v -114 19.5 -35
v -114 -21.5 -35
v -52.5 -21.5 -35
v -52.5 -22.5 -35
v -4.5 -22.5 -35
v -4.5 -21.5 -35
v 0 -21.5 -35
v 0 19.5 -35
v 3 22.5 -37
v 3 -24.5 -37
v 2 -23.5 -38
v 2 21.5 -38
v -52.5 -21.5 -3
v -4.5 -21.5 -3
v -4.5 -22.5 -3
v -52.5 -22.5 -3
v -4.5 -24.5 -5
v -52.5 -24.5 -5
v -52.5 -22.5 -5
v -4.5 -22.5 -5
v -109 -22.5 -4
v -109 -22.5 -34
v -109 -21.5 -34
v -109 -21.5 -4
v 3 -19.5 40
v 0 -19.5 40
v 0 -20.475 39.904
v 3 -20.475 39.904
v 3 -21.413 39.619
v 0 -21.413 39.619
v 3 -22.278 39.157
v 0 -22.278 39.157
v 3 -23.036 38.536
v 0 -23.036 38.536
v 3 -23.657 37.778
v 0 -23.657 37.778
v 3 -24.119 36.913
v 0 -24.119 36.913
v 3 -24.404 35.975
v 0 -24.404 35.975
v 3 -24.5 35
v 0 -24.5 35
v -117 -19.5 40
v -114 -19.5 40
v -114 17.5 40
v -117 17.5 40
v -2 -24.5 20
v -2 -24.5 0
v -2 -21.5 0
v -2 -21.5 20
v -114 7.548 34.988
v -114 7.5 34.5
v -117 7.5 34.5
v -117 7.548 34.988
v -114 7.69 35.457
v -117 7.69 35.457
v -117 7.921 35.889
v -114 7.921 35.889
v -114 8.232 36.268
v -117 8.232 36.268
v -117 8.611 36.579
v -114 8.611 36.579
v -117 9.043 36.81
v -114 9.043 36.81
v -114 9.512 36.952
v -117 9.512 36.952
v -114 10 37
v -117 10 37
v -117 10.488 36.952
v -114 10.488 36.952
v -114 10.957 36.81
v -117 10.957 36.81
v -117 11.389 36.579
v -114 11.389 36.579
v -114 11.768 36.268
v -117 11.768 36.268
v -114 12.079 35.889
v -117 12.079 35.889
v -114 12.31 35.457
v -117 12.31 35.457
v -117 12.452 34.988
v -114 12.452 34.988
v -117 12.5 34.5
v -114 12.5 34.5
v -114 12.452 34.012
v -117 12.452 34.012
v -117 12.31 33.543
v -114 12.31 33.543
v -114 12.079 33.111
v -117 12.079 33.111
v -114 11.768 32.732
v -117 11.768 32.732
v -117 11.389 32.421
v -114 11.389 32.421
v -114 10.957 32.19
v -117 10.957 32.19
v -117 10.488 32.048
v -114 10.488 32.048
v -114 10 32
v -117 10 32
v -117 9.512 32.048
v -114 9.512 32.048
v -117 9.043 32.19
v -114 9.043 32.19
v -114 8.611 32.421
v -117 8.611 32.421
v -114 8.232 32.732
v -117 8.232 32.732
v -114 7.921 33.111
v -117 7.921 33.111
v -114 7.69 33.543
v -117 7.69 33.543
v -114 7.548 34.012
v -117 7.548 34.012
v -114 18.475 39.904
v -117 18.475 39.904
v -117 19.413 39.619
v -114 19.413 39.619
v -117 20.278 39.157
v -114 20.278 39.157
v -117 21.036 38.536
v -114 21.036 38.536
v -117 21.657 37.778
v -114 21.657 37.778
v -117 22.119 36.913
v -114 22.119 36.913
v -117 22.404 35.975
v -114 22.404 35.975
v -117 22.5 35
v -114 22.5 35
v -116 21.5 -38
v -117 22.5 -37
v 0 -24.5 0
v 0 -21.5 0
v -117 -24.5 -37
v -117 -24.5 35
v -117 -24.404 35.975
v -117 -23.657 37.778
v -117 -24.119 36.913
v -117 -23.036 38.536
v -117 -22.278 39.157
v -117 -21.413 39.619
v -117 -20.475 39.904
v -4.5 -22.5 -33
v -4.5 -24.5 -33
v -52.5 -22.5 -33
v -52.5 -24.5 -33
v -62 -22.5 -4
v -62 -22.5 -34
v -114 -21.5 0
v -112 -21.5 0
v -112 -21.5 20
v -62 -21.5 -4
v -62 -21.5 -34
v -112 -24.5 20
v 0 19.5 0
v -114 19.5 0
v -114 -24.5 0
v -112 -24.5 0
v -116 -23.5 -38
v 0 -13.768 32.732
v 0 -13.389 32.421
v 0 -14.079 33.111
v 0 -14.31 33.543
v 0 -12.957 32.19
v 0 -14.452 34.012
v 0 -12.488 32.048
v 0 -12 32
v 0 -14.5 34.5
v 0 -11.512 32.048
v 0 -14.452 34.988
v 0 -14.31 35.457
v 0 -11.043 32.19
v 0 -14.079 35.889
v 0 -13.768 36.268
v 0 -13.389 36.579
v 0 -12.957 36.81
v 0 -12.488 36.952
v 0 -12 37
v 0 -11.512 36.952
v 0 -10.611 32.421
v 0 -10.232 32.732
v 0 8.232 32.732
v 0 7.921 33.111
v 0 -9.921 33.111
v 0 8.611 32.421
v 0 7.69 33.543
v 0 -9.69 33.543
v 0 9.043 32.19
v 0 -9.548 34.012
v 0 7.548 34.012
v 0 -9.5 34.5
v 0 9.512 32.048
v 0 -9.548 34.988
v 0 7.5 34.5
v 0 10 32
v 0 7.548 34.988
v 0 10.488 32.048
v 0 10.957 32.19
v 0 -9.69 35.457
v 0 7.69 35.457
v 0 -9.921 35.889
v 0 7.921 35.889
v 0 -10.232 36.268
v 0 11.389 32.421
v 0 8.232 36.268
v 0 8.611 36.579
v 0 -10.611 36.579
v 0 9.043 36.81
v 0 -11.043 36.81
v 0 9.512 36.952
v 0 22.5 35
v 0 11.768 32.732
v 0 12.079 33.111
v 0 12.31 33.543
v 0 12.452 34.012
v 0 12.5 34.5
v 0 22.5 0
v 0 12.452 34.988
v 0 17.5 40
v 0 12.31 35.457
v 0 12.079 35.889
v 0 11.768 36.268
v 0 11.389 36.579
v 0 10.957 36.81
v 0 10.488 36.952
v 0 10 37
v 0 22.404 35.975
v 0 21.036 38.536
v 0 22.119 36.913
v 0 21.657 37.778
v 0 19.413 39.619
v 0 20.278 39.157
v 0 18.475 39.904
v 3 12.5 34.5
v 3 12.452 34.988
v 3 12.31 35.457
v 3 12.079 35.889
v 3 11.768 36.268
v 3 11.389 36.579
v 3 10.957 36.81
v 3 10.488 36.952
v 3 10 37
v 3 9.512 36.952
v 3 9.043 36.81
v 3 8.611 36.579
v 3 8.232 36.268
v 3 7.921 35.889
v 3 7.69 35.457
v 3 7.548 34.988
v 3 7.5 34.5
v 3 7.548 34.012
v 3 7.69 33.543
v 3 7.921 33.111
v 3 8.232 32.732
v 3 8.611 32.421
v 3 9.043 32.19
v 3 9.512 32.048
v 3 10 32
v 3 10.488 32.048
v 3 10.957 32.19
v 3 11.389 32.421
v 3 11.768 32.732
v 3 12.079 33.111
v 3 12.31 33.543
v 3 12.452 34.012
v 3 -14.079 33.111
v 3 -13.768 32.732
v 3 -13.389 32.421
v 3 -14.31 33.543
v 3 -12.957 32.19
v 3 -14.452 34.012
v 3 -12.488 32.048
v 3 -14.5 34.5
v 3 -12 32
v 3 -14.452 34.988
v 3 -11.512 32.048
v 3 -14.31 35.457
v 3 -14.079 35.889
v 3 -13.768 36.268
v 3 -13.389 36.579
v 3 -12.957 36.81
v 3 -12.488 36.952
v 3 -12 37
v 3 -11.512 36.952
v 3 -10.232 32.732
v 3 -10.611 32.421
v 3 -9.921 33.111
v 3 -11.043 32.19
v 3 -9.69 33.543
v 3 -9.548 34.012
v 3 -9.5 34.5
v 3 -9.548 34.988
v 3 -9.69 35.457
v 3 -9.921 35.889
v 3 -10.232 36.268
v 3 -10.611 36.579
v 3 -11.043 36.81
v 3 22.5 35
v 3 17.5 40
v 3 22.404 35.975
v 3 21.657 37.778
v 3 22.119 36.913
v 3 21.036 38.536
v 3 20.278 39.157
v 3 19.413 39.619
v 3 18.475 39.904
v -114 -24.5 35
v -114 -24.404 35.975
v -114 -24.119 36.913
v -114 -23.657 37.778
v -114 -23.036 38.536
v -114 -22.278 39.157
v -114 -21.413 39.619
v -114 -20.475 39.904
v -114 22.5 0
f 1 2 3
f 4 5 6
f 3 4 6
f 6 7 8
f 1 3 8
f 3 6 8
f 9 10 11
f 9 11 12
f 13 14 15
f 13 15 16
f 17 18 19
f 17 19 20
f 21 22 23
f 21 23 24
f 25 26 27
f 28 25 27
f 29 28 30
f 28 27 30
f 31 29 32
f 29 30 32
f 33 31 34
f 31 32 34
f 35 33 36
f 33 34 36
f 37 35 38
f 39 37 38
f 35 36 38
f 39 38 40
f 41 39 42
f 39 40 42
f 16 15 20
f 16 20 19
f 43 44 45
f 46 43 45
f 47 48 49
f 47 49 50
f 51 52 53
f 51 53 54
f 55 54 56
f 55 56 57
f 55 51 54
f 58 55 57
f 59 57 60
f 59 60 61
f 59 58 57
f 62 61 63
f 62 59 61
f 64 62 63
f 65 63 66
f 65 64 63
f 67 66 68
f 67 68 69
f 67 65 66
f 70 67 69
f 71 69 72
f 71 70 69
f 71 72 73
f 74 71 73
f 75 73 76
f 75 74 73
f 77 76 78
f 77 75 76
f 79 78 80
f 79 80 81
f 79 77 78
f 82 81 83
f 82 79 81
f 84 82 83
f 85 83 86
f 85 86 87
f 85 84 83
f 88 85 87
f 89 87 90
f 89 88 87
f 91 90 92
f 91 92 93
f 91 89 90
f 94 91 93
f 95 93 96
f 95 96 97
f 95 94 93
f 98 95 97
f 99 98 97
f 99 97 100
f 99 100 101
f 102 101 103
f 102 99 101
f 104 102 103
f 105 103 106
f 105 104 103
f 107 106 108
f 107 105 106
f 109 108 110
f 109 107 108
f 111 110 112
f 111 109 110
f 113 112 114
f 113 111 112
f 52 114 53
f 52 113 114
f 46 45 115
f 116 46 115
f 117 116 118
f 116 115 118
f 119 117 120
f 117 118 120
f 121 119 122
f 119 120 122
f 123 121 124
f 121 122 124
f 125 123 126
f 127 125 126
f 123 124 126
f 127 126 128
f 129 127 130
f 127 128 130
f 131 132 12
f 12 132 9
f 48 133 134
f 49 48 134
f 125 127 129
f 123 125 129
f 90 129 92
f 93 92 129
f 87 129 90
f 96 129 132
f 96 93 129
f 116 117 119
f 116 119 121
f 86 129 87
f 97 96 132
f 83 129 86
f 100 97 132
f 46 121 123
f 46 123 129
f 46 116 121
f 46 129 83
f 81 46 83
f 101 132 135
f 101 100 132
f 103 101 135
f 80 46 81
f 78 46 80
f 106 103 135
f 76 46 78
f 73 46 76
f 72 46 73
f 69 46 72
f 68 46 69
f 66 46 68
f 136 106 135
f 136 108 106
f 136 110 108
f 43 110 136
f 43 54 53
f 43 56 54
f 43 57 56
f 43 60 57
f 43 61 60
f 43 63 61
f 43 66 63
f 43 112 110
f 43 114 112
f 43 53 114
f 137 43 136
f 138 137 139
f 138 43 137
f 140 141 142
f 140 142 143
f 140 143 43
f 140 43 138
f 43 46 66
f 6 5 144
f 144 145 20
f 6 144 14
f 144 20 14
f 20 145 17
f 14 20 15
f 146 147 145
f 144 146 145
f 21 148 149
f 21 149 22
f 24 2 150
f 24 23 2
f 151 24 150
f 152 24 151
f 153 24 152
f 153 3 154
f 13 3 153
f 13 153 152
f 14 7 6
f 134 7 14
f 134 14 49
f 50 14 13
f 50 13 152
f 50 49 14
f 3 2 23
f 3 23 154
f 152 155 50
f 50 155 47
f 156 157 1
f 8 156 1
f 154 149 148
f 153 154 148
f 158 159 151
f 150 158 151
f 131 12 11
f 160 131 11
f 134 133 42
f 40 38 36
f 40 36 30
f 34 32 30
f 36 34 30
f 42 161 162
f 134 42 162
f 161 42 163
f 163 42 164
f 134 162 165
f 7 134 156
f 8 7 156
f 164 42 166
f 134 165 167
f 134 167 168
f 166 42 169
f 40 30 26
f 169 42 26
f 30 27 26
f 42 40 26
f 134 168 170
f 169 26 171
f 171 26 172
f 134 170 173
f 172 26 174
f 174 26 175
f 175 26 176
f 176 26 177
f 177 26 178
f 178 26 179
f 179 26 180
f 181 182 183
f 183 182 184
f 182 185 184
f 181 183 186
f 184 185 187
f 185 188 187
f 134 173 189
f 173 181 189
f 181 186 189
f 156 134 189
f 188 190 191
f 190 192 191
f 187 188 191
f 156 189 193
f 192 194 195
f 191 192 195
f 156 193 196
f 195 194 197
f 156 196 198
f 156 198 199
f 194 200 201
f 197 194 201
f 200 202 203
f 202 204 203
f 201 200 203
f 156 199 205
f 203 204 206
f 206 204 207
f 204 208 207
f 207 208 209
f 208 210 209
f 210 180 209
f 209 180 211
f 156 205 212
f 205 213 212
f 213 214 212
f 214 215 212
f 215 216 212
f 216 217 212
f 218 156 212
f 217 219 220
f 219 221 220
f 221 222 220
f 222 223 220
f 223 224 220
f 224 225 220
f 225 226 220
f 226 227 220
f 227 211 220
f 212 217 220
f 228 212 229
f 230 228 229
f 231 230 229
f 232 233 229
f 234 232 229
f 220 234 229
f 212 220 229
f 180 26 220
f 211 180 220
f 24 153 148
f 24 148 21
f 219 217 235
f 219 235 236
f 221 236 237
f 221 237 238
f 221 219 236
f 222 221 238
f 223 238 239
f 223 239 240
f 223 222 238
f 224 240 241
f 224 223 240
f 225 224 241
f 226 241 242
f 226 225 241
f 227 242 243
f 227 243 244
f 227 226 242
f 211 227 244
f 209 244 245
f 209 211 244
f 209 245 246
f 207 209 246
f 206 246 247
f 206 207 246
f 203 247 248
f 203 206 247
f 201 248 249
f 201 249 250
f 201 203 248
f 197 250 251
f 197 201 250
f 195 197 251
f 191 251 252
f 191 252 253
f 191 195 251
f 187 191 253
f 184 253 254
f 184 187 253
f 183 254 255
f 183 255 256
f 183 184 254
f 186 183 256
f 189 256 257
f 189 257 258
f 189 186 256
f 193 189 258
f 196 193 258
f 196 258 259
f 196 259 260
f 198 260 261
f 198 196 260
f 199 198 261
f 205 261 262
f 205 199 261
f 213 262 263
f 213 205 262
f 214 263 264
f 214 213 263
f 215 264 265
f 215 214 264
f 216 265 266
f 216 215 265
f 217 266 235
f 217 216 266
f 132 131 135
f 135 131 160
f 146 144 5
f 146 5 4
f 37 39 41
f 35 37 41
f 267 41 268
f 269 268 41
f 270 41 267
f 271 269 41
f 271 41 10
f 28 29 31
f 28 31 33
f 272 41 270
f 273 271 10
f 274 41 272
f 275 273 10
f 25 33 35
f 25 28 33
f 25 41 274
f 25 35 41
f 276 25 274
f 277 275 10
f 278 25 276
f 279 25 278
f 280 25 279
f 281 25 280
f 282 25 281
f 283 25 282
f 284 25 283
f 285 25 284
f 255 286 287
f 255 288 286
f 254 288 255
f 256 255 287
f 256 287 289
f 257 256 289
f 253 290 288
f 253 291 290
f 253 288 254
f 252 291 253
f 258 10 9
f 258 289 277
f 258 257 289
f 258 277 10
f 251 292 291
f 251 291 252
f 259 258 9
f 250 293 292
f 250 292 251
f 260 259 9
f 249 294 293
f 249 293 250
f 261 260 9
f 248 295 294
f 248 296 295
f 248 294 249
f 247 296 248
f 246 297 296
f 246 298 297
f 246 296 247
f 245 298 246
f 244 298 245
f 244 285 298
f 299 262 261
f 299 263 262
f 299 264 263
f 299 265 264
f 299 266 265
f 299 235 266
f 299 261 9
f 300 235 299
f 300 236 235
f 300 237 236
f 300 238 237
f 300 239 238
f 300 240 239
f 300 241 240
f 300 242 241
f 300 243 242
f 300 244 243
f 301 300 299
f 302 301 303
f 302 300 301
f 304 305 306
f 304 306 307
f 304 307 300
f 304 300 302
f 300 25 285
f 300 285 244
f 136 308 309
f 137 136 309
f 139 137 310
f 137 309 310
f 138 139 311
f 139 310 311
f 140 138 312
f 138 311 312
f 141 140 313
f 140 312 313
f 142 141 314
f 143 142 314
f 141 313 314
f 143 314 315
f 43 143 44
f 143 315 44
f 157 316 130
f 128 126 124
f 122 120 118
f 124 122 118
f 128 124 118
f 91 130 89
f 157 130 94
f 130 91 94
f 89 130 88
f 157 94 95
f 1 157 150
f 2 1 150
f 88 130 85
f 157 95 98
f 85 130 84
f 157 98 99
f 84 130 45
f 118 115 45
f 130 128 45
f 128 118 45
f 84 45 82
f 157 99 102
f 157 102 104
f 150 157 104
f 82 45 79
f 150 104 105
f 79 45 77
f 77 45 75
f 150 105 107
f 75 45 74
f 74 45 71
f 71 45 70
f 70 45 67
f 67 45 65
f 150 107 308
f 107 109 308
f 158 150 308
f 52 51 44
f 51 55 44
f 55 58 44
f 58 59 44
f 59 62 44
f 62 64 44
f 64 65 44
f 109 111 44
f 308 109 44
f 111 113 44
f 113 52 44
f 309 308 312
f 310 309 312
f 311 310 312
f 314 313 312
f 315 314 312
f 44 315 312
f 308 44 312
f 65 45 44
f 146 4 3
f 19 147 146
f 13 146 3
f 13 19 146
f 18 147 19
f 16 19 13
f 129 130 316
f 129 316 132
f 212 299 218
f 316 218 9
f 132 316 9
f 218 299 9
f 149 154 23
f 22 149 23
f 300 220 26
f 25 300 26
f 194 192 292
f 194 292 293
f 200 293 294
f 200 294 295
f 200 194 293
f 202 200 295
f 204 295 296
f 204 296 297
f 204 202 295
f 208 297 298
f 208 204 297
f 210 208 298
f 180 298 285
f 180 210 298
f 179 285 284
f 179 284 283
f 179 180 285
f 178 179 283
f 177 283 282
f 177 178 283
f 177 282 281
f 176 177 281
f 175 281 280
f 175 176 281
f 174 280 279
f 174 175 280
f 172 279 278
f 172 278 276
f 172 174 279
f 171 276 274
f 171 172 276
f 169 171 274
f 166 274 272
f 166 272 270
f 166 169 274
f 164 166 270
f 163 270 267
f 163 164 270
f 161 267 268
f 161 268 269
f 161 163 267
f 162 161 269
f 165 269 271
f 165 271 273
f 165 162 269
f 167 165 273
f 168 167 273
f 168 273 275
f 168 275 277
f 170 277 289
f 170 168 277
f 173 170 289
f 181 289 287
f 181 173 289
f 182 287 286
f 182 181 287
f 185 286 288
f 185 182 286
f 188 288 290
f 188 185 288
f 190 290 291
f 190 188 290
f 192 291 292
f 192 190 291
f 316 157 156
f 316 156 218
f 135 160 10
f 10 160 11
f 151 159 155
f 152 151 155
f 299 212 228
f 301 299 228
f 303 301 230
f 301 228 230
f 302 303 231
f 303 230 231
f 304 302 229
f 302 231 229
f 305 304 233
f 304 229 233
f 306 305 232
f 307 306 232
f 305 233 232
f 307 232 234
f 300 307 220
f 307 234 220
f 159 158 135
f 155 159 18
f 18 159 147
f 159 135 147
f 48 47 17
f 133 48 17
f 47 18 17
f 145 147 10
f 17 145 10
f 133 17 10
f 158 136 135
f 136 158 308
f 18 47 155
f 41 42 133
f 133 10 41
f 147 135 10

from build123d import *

# Parameters (mm, degrees)
F2_R      = 2.5
F3_DEPTH  = 3
F4_W      = 3
F4_H      = 35
F4_H_2    = 3
F4_W_2    = 41
F5_DEPTH  = 114
F6_R      = 2.5
F7_DEPTH  = 3
F8_W      = 110
F8_H      = 20
F9_DEPTH  = 3
F10_W     = 47
F10_H     = 26
F10_W_2   = 48
F10_H_2   = 28
F11_DEPTH = 3
F12_SIZE  = 1
F14_W     = 48
F14_H     = 2
F14_W_2   = 47
F15_DEPTH = 1
F16_DEPTH = 26


with BuildPart() as f3:
    # F2 (on Right) → F3 (new body)
    with BuildSketch(Plane.YZ):
        with BuildLine():
            ThreePointArc((22.5, 35), (21.0355339059, 38.5355339059), (17.5, 40))
            Line((17.5, 40), (-19.5, 40))
            ThreePointArc((-19.5, 40), (-23.0355339059, 38.5355339059), (-24.5, 35))
            Line((-24.5, 35), (-24.5, -38))
            Line((-24.5, -38), (22.5, -38))
            Line((22.5, -38), (22.5, 35))
        make_face()
        with Locations((-12, 34.5)):
            Circle(F2_R, mode=Mode.SUBTRACT)
        with Locations((10, 34.5)):
            Circle(F2_R, mode=Mode.SUBTRACT)
    extrude(amount=F3_DEPTH)

    # F4 (on Right) → F5 (join)
    with BuildSketch(Plane.YZ):
        with Locations((-23, -17.5)):
            Rectangle(F4_W, F4_H)
        with Locations((21, -36.5)):
            Rectangle(F4_W, F4_H_2)
        with Locations((21, -17.5)):
            Rectangle(F4_W, F4_H)
        with Locations((-1, -36.5)):
            Rectangle(F4_W_2, F4_H_2)
        with Locations((-23, -36.5)):
            Rectangle(F4_W, F4_H_2)
    extrude(amount=-F5_DEPTH)

    # F6 (on face) → F7 (join)
    with BuildSketch(Plane(origin=(-114, 0, 0), x_dir=(0, -1, 0), z_dir=(-1, 0, 0))):
        with BuildLine():
            ThreePointArc((24.5, 35), (23.0355339059, 38.5355339059), (19.5, 40))
            Line((19.5, 40), (-17.5, 40))
            ThreePointArc((-17.5, 40), (-21.0355339059, 38.5355339059), (-22.5, 35))
            Line((-22.5, 35), (-22.5, -38))
            Line((-22.5, -38), (24.5, -38))
            Line((24.5, -38), (24.5, 35))
        make_face()
        with Locations((-10, 34.5)):
            Circle(F6_R, mode=Mode.SUBTRACT)
    extrude(amount=F7_DEPTH)

    # F8 (on face) → F9 (join)
    with BuildSketch(Plane.XZ.offset(24.5)):
        with Locations((-57, 10)):
            Rectangle(F8_W, F8_H)
    extrude(amount=-F9_DEPTH)

    # F10 (on face) → F11 (cut, through all)
    with BuildSketch(Plane.XZ.offset(24.5)):
        with Locations((-85.5, -19)):
            Rectangle(F10_W, F10_H)
        with Locations((-28.5, -19)):
            Rectangle(F10_W_2, F10_H_2)
    extrude(amount=-F11_DEPTH, mode=Mode.SUBTRACT)

    # F12
    f12_edges = [f3.edges().sort_by_distance(p)[0] for p in [
        (-57, -24.5, -38),
        (3, -1, -38),
        (-57, 22.5, -38),
        (-117, -1, -38),
    ]]
    chamfer(f12_edges, length=F12_SIZE)

    # F14 (on face) → F15 (cut)
    with BuildSketch(Plane(origin=(0, -21.5, 0), x_dir=(-1, 0, 0), z_dir=(0, 1, 0))):
        with Locations((28.5, -34)):
            Rectangle(F14_W, F14_H)
        with Locations((85.5, -33)):
            Rectangle(F14_W_2, F14_H)
        with Locations((85.5, -5)):
            Rectangle(F14_W_2, F14_H)
        with Locations((28.5, -4)):
            Rectangle(F14_W, F14_H)
    extrude(amount=-F15_DEPTH, mode=Mode.SUBTRACT)

    # F16 (add): a face of the model
    f16_faces = [f3.faces().sort_by_distance(p)[0] for p in [
        (-85.5, -23.5, -32),
    ]]
    extrude(f16_faces, amount=F16_DEPTH)


solid = f3.part
